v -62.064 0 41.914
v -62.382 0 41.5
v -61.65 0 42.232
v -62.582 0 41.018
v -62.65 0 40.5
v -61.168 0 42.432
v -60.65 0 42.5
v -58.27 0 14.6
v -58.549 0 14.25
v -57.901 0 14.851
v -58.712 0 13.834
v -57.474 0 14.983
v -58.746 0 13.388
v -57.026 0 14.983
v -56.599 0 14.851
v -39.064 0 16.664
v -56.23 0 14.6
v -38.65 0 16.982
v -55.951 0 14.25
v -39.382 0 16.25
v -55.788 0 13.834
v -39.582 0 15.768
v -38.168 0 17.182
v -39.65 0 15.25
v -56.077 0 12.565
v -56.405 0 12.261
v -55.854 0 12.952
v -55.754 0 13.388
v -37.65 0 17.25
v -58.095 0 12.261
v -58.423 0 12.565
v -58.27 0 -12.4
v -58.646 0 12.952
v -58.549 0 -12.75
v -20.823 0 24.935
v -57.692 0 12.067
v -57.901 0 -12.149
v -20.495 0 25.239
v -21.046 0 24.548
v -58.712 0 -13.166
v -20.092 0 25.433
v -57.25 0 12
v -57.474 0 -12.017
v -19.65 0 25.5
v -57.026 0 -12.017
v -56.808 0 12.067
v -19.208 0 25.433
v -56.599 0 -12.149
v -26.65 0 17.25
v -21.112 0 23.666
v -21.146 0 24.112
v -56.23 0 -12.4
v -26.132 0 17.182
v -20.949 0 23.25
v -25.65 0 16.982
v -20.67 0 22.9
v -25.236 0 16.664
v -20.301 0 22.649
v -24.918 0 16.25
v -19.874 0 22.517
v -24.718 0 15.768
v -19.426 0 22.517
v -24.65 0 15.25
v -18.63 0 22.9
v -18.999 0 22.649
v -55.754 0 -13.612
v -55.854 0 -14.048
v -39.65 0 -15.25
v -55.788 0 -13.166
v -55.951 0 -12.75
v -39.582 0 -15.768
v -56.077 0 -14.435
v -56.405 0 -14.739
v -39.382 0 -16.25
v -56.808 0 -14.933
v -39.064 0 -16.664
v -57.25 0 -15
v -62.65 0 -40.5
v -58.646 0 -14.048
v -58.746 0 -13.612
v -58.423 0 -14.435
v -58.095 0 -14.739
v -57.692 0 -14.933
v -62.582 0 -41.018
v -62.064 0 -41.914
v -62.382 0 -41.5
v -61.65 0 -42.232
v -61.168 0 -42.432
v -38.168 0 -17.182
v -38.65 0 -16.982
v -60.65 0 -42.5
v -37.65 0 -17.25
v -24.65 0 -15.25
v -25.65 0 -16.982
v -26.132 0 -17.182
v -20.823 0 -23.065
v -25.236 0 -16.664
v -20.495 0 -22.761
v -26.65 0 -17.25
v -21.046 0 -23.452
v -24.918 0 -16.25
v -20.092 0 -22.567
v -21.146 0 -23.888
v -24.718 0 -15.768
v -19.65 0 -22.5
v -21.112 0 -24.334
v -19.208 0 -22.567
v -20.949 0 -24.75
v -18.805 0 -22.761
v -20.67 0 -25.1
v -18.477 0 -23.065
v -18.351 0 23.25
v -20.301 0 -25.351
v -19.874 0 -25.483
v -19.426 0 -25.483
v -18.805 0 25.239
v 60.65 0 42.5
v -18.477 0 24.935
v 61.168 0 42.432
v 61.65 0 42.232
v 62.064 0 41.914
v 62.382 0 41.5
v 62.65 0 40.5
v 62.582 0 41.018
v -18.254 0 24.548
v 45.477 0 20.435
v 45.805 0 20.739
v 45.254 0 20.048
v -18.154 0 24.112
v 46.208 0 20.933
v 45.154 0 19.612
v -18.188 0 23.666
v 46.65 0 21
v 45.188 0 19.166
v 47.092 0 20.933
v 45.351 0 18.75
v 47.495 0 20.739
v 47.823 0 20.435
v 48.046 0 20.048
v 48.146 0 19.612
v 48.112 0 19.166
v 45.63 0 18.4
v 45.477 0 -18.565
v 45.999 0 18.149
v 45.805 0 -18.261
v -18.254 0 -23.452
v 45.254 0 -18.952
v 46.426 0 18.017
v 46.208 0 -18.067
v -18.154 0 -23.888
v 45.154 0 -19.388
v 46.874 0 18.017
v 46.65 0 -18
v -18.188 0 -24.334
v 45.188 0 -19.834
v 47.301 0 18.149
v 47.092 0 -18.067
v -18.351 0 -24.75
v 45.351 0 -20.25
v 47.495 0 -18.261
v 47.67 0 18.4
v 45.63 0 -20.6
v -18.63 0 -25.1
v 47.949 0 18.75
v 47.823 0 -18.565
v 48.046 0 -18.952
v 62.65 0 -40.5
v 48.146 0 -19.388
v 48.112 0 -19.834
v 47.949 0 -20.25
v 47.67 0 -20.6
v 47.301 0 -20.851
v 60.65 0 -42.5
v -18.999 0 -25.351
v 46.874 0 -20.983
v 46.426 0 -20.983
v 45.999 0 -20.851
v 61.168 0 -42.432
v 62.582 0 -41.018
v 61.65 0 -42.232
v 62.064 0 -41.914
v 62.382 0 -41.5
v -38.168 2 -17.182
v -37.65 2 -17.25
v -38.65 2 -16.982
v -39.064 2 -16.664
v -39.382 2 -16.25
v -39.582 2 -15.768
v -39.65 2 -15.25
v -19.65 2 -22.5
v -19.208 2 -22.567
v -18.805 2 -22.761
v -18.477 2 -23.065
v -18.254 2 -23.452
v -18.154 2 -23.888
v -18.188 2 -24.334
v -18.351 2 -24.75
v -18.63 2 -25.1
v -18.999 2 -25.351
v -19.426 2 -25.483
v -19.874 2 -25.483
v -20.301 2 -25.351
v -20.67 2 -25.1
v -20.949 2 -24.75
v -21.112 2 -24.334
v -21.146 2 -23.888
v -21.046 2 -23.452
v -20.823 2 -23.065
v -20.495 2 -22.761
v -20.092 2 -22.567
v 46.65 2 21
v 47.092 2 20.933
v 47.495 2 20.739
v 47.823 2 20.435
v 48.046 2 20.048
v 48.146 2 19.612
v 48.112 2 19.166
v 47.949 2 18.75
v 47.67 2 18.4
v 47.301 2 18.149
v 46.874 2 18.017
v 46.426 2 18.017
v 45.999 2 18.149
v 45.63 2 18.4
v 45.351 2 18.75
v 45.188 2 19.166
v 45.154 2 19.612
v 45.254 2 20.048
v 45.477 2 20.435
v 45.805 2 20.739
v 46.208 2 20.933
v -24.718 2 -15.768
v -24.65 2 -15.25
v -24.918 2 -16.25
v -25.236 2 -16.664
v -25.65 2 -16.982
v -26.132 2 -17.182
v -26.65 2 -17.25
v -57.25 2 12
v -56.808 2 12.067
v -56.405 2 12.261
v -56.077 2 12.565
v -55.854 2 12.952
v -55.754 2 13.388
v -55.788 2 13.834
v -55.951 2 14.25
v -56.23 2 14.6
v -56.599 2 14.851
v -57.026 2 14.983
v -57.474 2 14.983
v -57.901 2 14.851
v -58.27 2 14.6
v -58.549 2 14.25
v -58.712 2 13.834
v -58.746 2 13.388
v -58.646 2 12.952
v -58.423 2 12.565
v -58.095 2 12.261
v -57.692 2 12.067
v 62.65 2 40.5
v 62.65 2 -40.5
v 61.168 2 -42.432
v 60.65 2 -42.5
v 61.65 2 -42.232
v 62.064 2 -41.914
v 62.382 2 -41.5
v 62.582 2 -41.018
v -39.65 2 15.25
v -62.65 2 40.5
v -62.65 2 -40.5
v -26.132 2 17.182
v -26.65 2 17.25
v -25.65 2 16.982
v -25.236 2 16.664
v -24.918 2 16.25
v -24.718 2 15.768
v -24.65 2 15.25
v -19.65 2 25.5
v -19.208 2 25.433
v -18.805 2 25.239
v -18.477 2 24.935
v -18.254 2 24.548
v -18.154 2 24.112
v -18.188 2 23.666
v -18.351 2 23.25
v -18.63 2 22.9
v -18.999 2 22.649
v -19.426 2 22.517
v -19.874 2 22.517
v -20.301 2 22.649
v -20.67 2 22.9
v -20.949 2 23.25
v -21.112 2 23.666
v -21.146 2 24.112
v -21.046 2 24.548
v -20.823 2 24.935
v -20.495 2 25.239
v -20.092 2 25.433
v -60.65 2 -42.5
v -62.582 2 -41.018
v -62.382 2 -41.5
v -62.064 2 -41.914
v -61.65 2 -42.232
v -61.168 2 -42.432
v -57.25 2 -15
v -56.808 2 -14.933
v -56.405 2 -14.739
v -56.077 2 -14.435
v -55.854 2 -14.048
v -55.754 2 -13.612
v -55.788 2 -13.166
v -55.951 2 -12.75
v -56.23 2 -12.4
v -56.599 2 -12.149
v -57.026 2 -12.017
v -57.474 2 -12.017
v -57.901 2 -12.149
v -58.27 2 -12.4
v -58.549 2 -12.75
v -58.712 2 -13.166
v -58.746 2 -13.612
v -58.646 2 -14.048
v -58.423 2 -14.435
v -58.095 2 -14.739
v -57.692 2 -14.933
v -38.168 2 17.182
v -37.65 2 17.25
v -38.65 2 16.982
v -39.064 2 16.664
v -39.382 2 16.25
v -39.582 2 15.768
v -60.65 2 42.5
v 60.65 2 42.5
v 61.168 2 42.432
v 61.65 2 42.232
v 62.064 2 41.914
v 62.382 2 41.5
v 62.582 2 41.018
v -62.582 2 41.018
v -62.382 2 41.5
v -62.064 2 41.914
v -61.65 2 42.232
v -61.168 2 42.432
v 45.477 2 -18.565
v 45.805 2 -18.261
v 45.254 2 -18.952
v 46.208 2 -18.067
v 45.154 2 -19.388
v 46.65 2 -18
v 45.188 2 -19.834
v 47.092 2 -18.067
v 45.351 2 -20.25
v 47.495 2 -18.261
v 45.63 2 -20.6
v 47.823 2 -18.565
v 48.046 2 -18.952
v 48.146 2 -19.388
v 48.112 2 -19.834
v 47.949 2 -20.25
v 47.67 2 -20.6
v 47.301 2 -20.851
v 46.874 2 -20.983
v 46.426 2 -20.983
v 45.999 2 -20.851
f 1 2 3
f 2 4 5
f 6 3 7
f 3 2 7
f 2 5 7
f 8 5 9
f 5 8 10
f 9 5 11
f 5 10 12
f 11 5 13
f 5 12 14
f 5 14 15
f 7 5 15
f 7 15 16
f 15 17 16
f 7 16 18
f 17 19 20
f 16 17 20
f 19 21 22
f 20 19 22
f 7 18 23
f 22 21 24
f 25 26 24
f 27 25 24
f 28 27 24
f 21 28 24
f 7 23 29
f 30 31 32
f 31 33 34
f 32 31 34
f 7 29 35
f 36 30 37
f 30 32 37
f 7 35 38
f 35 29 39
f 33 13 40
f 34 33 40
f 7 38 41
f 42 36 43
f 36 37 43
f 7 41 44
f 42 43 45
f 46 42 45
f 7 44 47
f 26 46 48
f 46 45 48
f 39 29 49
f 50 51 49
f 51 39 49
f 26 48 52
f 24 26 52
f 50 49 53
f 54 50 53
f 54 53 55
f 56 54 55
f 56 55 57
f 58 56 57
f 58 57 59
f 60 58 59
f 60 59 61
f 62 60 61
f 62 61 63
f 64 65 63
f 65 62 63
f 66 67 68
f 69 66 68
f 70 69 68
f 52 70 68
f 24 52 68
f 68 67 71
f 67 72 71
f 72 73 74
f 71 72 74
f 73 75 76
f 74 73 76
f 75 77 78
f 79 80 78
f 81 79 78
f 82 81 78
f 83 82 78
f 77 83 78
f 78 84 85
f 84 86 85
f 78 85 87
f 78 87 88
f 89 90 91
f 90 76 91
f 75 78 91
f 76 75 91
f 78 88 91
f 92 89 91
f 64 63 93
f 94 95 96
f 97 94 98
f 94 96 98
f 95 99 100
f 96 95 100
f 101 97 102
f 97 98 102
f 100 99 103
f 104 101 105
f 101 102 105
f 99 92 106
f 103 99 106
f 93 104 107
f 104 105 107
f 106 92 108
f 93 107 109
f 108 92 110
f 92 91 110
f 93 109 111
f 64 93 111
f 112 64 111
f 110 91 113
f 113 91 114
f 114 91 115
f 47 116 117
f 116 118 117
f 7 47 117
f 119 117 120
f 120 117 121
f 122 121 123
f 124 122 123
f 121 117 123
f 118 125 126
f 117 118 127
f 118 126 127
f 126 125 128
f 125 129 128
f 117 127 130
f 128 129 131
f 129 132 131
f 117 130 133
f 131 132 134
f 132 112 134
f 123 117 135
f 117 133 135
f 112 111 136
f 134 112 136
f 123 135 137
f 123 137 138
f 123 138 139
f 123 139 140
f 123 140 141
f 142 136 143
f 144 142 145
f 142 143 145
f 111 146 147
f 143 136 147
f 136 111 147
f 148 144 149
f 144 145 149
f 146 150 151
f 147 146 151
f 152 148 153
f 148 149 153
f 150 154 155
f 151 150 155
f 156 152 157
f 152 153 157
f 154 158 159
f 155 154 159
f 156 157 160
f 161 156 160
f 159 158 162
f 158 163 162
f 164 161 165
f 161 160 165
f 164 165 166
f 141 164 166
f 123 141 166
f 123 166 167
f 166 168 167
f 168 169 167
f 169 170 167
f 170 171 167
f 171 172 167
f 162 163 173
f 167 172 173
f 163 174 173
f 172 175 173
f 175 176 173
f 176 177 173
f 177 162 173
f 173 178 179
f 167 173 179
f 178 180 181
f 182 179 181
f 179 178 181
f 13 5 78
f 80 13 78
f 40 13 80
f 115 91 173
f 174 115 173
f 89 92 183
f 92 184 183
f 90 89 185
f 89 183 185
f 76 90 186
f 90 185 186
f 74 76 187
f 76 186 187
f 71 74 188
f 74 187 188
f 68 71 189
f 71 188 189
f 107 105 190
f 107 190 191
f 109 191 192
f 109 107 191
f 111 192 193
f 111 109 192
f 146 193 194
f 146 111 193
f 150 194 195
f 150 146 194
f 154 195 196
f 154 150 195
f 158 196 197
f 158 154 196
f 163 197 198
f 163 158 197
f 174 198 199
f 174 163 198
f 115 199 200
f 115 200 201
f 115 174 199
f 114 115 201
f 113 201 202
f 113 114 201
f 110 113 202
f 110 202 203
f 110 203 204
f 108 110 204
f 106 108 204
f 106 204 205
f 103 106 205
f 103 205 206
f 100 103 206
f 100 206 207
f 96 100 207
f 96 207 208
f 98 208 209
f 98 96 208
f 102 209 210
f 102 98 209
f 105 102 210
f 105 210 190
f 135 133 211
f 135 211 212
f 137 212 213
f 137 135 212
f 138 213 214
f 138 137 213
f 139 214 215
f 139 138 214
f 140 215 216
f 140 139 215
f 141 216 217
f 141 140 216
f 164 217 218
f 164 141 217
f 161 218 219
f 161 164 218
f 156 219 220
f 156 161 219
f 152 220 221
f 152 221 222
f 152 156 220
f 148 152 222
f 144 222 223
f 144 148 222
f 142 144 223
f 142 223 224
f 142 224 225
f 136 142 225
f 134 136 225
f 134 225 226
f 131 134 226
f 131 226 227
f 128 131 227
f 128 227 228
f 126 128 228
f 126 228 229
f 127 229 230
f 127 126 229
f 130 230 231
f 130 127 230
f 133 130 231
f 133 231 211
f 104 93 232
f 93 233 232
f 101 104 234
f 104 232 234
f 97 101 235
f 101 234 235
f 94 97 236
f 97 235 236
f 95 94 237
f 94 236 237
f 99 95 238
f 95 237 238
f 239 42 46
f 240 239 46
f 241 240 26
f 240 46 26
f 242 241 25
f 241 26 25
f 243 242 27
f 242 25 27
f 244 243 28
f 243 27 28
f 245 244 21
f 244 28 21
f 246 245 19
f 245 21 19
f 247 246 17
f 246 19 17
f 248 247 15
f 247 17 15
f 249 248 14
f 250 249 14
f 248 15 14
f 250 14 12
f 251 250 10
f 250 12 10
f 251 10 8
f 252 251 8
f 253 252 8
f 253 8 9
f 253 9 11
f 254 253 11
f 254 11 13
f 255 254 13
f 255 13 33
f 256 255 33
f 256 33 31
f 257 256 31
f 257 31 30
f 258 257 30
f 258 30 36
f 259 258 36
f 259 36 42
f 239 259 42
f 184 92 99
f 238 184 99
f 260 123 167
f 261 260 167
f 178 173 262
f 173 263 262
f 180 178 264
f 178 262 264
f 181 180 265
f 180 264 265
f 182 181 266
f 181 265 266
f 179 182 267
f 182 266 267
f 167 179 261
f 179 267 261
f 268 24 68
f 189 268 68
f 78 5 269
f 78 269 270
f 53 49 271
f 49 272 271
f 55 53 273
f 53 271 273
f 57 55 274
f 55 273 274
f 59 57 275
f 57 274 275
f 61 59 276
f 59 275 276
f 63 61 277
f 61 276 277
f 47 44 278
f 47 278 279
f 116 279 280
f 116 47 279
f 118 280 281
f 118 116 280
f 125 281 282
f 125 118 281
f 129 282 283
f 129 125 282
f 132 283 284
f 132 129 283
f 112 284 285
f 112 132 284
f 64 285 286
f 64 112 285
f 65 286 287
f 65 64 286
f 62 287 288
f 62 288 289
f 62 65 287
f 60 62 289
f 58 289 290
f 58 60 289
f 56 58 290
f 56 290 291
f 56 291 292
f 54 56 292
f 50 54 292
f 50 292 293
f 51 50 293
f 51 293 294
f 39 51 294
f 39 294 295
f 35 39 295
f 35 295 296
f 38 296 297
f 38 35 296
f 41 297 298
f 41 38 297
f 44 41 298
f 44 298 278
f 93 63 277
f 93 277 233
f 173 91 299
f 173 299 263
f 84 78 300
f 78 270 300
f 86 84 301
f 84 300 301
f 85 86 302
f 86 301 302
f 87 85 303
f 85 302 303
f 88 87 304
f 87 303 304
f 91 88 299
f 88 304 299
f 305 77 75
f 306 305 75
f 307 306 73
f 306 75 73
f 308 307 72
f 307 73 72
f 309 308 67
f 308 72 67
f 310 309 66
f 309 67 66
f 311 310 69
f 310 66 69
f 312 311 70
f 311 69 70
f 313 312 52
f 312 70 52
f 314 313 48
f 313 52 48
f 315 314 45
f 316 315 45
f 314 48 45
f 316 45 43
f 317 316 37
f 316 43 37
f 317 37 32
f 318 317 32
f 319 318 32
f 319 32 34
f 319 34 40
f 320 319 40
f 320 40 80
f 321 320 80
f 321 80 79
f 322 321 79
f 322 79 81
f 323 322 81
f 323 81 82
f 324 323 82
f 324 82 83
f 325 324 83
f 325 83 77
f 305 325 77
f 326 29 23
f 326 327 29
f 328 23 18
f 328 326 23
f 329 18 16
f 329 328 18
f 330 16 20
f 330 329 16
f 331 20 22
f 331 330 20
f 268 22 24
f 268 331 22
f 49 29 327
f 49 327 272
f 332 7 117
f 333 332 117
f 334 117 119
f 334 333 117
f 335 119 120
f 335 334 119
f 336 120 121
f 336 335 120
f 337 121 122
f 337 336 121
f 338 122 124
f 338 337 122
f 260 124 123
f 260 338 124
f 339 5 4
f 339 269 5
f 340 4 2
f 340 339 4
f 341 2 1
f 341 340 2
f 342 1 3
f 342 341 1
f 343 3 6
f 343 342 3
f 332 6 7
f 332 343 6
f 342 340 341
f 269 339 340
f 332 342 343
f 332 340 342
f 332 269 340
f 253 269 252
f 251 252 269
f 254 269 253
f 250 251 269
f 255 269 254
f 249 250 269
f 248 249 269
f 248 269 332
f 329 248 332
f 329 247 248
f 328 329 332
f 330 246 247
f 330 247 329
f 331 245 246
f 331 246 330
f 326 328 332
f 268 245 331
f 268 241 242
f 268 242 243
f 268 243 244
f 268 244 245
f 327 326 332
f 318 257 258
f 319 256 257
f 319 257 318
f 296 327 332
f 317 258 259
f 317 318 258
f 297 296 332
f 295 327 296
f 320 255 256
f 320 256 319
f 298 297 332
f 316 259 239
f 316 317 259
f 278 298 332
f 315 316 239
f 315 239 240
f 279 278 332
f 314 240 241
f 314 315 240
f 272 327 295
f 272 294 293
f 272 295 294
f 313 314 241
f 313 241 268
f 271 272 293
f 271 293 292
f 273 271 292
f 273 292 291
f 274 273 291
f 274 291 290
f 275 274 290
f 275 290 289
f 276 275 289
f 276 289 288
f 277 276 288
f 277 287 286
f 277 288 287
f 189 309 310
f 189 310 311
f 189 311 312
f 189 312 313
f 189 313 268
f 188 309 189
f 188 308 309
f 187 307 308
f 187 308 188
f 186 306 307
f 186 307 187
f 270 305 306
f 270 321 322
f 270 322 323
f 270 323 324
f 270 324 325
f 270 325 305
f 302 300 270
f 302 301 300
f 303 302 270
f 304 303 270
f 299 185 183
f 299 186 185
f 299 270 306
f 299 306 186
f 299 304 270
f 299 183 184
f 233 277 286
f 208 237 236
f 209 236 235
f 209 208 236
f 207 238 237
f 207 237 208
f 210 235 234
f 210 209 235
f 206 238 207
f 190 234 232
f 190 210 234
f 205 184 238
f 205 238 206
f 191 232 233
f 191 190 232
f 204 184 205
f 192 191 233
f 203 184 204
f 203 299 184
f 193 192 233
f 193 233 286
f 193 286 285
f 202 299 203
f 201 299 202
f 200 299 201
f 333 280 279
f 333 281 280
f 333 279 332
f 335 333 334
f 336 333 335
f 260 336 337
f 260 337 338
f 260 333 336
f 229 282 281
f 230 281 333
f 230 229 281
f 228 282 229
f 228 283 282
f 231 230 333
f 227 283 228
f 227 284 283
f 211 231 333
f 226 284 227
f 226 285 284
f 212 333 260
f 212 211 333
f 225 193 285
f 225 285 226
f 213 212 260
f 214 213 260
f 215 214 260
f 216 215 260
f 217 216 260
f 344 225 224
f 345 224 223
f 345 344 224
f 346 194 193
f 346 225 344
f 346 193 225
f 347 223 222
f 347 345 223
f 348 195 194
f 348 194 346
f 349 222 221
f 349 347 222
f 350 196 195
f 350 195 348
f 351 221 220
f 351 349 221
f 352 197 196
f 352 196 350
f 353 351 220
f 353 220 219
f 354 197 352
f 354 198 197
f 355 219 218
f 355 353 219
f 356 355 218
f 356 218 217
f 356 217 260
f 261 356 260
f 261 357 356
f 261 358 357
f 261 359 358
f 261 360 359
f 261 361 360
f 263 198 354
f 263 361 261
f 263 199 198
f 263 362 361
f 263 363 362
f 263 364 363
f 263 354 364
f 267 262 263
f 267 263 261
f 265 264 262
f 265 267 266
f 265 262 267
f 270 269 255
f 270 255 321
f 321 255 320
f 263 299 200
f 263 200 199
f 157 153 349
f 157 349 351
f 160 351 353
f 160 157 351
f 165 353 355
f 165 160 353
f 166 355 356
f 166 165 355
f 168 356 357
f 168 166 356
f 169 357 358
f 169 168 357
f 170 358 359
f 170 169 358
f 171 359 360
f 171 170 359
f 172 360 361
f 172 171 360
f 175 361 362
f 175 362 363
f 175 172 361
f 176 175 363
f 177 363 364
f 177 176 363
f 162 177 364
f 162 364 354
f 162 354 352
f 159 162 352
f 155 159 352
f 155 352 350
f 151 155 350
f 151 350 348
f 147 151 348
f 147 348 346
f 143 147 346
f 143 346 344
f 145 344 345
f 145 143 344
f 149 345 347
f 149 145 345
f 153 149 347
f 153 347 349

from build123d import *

# Parameters (mm, degrees)
SKETCH_1_W          = 125.3
SKETCH_1_H          = 85
SKETCH_1_R          = 1.5
SKETCH_1_W_2        = 15
SKETCH_1_H_2        = 34.5
EXTRUDE_1_DEPTH     = 2
FILLET_1_R          = 2
CUT_EXTRUDE_2_REACH = 77.732
SKETCH_2_R          = 1.5


with BuildPart() as part:
    # 草图1 → 凸台-拉伸1 (new body)
    with BuildSketch(Plane(origin=(0, 0, 0), x_dir=(1, 0, 0), z_dir=(0, 1, 0))):
        Rectangle(SKETCH_1_W, SKETCH_1_H)
        with Locations(Location((-19.65, 24, 0), (0, 0, 270))):
            Circle(SKETCH_1_R, mode=Mode.SUBTRACT)
        with Locations(Location((-19.65, -24, 0), (0, 0, 270))):
            Circle(SKETCH_1_R, mode=Mode.SUBTRACT)
        with Locations(Location((46.65, 19.5, 0), (0, 0, 270))):
            Circle(SKETCH_1_R, mode=Mode.SUBTRACT)
        with Locations(Location((46.65, -19.5, 0), (0, 0, 270))):
            Circle(SKETCH_1_R, mode=Mode.SUBTRACT)
        with Locations((-32.15, 0)):
            Rectangle(SKETCH_1_W_2, SKETCH_1_H_2, mode=Mode.SUBTRACT)
    extrude(amount=EXTRUDE_1_DEPTH)

    # 圆角1
    fillet_1_edges = [part.edges().sort_by_distance(p)[0] for p in [
        (-39.65, 1, -17.25),
        (-39.65, 1, 17.25),
        (-24.65, 1, 17.25),
        (-24.65, 1, -17.25),
        (62.65, 1, 42.5),
        (-62.65, 1, 42.5),
        (-62.65, 1, -42.5),
        (62.65, 1, -42.5),
    ]]
    fillet(fillet_1_edges, radius=FILLET_1_R)

    # 草图2 → 切除-拉伸2 (cut, up to next)
    with BuildSketch(Plane.XZ, mode=Mode.PRIVATE) as cut_extrude_2_sk1:
        with Locations(Location((-57.25, -13.5, 0), (0, 0, 270))):
            Circle(SKETCH_2_R)
    cut_extrude_2_tool1 = extrude(cut_extrude_2_sk1.sketch, amount=-CUT_EXTRUDE_2_REACH, mode=Mode.PRIVATE) & part.part
    # 草图2 → 切除-拉伸2 (cut, up to next)
    with BuildSketch(Plane.XZ, mode=Mode.PRIVATE) as cut_extrude_2_sk2:
        with Locations(Location((-57.25, 13.5, 0), (0, 0, 270))):
            Circle(SKETCH_2_R)
    cut_extrude_2_tool2 = extrude(cut_extrude_2_sk2.sketch, amount=-CUT_EXTRUDE_2_REACH, mode=Mode.PRIVATE) & part.part
    add(cut_extrude_2_tool1.solids().sort_by_distance((-57.25, 0, -13.5))[0], mode=Mode.SUBTRACT)
    add(cut_extrude_2_tool2.solids().sort_by_distance((-57.25, 0, 13.5))[0], mode=Mode.SUBTRACT)


solid = part.part
